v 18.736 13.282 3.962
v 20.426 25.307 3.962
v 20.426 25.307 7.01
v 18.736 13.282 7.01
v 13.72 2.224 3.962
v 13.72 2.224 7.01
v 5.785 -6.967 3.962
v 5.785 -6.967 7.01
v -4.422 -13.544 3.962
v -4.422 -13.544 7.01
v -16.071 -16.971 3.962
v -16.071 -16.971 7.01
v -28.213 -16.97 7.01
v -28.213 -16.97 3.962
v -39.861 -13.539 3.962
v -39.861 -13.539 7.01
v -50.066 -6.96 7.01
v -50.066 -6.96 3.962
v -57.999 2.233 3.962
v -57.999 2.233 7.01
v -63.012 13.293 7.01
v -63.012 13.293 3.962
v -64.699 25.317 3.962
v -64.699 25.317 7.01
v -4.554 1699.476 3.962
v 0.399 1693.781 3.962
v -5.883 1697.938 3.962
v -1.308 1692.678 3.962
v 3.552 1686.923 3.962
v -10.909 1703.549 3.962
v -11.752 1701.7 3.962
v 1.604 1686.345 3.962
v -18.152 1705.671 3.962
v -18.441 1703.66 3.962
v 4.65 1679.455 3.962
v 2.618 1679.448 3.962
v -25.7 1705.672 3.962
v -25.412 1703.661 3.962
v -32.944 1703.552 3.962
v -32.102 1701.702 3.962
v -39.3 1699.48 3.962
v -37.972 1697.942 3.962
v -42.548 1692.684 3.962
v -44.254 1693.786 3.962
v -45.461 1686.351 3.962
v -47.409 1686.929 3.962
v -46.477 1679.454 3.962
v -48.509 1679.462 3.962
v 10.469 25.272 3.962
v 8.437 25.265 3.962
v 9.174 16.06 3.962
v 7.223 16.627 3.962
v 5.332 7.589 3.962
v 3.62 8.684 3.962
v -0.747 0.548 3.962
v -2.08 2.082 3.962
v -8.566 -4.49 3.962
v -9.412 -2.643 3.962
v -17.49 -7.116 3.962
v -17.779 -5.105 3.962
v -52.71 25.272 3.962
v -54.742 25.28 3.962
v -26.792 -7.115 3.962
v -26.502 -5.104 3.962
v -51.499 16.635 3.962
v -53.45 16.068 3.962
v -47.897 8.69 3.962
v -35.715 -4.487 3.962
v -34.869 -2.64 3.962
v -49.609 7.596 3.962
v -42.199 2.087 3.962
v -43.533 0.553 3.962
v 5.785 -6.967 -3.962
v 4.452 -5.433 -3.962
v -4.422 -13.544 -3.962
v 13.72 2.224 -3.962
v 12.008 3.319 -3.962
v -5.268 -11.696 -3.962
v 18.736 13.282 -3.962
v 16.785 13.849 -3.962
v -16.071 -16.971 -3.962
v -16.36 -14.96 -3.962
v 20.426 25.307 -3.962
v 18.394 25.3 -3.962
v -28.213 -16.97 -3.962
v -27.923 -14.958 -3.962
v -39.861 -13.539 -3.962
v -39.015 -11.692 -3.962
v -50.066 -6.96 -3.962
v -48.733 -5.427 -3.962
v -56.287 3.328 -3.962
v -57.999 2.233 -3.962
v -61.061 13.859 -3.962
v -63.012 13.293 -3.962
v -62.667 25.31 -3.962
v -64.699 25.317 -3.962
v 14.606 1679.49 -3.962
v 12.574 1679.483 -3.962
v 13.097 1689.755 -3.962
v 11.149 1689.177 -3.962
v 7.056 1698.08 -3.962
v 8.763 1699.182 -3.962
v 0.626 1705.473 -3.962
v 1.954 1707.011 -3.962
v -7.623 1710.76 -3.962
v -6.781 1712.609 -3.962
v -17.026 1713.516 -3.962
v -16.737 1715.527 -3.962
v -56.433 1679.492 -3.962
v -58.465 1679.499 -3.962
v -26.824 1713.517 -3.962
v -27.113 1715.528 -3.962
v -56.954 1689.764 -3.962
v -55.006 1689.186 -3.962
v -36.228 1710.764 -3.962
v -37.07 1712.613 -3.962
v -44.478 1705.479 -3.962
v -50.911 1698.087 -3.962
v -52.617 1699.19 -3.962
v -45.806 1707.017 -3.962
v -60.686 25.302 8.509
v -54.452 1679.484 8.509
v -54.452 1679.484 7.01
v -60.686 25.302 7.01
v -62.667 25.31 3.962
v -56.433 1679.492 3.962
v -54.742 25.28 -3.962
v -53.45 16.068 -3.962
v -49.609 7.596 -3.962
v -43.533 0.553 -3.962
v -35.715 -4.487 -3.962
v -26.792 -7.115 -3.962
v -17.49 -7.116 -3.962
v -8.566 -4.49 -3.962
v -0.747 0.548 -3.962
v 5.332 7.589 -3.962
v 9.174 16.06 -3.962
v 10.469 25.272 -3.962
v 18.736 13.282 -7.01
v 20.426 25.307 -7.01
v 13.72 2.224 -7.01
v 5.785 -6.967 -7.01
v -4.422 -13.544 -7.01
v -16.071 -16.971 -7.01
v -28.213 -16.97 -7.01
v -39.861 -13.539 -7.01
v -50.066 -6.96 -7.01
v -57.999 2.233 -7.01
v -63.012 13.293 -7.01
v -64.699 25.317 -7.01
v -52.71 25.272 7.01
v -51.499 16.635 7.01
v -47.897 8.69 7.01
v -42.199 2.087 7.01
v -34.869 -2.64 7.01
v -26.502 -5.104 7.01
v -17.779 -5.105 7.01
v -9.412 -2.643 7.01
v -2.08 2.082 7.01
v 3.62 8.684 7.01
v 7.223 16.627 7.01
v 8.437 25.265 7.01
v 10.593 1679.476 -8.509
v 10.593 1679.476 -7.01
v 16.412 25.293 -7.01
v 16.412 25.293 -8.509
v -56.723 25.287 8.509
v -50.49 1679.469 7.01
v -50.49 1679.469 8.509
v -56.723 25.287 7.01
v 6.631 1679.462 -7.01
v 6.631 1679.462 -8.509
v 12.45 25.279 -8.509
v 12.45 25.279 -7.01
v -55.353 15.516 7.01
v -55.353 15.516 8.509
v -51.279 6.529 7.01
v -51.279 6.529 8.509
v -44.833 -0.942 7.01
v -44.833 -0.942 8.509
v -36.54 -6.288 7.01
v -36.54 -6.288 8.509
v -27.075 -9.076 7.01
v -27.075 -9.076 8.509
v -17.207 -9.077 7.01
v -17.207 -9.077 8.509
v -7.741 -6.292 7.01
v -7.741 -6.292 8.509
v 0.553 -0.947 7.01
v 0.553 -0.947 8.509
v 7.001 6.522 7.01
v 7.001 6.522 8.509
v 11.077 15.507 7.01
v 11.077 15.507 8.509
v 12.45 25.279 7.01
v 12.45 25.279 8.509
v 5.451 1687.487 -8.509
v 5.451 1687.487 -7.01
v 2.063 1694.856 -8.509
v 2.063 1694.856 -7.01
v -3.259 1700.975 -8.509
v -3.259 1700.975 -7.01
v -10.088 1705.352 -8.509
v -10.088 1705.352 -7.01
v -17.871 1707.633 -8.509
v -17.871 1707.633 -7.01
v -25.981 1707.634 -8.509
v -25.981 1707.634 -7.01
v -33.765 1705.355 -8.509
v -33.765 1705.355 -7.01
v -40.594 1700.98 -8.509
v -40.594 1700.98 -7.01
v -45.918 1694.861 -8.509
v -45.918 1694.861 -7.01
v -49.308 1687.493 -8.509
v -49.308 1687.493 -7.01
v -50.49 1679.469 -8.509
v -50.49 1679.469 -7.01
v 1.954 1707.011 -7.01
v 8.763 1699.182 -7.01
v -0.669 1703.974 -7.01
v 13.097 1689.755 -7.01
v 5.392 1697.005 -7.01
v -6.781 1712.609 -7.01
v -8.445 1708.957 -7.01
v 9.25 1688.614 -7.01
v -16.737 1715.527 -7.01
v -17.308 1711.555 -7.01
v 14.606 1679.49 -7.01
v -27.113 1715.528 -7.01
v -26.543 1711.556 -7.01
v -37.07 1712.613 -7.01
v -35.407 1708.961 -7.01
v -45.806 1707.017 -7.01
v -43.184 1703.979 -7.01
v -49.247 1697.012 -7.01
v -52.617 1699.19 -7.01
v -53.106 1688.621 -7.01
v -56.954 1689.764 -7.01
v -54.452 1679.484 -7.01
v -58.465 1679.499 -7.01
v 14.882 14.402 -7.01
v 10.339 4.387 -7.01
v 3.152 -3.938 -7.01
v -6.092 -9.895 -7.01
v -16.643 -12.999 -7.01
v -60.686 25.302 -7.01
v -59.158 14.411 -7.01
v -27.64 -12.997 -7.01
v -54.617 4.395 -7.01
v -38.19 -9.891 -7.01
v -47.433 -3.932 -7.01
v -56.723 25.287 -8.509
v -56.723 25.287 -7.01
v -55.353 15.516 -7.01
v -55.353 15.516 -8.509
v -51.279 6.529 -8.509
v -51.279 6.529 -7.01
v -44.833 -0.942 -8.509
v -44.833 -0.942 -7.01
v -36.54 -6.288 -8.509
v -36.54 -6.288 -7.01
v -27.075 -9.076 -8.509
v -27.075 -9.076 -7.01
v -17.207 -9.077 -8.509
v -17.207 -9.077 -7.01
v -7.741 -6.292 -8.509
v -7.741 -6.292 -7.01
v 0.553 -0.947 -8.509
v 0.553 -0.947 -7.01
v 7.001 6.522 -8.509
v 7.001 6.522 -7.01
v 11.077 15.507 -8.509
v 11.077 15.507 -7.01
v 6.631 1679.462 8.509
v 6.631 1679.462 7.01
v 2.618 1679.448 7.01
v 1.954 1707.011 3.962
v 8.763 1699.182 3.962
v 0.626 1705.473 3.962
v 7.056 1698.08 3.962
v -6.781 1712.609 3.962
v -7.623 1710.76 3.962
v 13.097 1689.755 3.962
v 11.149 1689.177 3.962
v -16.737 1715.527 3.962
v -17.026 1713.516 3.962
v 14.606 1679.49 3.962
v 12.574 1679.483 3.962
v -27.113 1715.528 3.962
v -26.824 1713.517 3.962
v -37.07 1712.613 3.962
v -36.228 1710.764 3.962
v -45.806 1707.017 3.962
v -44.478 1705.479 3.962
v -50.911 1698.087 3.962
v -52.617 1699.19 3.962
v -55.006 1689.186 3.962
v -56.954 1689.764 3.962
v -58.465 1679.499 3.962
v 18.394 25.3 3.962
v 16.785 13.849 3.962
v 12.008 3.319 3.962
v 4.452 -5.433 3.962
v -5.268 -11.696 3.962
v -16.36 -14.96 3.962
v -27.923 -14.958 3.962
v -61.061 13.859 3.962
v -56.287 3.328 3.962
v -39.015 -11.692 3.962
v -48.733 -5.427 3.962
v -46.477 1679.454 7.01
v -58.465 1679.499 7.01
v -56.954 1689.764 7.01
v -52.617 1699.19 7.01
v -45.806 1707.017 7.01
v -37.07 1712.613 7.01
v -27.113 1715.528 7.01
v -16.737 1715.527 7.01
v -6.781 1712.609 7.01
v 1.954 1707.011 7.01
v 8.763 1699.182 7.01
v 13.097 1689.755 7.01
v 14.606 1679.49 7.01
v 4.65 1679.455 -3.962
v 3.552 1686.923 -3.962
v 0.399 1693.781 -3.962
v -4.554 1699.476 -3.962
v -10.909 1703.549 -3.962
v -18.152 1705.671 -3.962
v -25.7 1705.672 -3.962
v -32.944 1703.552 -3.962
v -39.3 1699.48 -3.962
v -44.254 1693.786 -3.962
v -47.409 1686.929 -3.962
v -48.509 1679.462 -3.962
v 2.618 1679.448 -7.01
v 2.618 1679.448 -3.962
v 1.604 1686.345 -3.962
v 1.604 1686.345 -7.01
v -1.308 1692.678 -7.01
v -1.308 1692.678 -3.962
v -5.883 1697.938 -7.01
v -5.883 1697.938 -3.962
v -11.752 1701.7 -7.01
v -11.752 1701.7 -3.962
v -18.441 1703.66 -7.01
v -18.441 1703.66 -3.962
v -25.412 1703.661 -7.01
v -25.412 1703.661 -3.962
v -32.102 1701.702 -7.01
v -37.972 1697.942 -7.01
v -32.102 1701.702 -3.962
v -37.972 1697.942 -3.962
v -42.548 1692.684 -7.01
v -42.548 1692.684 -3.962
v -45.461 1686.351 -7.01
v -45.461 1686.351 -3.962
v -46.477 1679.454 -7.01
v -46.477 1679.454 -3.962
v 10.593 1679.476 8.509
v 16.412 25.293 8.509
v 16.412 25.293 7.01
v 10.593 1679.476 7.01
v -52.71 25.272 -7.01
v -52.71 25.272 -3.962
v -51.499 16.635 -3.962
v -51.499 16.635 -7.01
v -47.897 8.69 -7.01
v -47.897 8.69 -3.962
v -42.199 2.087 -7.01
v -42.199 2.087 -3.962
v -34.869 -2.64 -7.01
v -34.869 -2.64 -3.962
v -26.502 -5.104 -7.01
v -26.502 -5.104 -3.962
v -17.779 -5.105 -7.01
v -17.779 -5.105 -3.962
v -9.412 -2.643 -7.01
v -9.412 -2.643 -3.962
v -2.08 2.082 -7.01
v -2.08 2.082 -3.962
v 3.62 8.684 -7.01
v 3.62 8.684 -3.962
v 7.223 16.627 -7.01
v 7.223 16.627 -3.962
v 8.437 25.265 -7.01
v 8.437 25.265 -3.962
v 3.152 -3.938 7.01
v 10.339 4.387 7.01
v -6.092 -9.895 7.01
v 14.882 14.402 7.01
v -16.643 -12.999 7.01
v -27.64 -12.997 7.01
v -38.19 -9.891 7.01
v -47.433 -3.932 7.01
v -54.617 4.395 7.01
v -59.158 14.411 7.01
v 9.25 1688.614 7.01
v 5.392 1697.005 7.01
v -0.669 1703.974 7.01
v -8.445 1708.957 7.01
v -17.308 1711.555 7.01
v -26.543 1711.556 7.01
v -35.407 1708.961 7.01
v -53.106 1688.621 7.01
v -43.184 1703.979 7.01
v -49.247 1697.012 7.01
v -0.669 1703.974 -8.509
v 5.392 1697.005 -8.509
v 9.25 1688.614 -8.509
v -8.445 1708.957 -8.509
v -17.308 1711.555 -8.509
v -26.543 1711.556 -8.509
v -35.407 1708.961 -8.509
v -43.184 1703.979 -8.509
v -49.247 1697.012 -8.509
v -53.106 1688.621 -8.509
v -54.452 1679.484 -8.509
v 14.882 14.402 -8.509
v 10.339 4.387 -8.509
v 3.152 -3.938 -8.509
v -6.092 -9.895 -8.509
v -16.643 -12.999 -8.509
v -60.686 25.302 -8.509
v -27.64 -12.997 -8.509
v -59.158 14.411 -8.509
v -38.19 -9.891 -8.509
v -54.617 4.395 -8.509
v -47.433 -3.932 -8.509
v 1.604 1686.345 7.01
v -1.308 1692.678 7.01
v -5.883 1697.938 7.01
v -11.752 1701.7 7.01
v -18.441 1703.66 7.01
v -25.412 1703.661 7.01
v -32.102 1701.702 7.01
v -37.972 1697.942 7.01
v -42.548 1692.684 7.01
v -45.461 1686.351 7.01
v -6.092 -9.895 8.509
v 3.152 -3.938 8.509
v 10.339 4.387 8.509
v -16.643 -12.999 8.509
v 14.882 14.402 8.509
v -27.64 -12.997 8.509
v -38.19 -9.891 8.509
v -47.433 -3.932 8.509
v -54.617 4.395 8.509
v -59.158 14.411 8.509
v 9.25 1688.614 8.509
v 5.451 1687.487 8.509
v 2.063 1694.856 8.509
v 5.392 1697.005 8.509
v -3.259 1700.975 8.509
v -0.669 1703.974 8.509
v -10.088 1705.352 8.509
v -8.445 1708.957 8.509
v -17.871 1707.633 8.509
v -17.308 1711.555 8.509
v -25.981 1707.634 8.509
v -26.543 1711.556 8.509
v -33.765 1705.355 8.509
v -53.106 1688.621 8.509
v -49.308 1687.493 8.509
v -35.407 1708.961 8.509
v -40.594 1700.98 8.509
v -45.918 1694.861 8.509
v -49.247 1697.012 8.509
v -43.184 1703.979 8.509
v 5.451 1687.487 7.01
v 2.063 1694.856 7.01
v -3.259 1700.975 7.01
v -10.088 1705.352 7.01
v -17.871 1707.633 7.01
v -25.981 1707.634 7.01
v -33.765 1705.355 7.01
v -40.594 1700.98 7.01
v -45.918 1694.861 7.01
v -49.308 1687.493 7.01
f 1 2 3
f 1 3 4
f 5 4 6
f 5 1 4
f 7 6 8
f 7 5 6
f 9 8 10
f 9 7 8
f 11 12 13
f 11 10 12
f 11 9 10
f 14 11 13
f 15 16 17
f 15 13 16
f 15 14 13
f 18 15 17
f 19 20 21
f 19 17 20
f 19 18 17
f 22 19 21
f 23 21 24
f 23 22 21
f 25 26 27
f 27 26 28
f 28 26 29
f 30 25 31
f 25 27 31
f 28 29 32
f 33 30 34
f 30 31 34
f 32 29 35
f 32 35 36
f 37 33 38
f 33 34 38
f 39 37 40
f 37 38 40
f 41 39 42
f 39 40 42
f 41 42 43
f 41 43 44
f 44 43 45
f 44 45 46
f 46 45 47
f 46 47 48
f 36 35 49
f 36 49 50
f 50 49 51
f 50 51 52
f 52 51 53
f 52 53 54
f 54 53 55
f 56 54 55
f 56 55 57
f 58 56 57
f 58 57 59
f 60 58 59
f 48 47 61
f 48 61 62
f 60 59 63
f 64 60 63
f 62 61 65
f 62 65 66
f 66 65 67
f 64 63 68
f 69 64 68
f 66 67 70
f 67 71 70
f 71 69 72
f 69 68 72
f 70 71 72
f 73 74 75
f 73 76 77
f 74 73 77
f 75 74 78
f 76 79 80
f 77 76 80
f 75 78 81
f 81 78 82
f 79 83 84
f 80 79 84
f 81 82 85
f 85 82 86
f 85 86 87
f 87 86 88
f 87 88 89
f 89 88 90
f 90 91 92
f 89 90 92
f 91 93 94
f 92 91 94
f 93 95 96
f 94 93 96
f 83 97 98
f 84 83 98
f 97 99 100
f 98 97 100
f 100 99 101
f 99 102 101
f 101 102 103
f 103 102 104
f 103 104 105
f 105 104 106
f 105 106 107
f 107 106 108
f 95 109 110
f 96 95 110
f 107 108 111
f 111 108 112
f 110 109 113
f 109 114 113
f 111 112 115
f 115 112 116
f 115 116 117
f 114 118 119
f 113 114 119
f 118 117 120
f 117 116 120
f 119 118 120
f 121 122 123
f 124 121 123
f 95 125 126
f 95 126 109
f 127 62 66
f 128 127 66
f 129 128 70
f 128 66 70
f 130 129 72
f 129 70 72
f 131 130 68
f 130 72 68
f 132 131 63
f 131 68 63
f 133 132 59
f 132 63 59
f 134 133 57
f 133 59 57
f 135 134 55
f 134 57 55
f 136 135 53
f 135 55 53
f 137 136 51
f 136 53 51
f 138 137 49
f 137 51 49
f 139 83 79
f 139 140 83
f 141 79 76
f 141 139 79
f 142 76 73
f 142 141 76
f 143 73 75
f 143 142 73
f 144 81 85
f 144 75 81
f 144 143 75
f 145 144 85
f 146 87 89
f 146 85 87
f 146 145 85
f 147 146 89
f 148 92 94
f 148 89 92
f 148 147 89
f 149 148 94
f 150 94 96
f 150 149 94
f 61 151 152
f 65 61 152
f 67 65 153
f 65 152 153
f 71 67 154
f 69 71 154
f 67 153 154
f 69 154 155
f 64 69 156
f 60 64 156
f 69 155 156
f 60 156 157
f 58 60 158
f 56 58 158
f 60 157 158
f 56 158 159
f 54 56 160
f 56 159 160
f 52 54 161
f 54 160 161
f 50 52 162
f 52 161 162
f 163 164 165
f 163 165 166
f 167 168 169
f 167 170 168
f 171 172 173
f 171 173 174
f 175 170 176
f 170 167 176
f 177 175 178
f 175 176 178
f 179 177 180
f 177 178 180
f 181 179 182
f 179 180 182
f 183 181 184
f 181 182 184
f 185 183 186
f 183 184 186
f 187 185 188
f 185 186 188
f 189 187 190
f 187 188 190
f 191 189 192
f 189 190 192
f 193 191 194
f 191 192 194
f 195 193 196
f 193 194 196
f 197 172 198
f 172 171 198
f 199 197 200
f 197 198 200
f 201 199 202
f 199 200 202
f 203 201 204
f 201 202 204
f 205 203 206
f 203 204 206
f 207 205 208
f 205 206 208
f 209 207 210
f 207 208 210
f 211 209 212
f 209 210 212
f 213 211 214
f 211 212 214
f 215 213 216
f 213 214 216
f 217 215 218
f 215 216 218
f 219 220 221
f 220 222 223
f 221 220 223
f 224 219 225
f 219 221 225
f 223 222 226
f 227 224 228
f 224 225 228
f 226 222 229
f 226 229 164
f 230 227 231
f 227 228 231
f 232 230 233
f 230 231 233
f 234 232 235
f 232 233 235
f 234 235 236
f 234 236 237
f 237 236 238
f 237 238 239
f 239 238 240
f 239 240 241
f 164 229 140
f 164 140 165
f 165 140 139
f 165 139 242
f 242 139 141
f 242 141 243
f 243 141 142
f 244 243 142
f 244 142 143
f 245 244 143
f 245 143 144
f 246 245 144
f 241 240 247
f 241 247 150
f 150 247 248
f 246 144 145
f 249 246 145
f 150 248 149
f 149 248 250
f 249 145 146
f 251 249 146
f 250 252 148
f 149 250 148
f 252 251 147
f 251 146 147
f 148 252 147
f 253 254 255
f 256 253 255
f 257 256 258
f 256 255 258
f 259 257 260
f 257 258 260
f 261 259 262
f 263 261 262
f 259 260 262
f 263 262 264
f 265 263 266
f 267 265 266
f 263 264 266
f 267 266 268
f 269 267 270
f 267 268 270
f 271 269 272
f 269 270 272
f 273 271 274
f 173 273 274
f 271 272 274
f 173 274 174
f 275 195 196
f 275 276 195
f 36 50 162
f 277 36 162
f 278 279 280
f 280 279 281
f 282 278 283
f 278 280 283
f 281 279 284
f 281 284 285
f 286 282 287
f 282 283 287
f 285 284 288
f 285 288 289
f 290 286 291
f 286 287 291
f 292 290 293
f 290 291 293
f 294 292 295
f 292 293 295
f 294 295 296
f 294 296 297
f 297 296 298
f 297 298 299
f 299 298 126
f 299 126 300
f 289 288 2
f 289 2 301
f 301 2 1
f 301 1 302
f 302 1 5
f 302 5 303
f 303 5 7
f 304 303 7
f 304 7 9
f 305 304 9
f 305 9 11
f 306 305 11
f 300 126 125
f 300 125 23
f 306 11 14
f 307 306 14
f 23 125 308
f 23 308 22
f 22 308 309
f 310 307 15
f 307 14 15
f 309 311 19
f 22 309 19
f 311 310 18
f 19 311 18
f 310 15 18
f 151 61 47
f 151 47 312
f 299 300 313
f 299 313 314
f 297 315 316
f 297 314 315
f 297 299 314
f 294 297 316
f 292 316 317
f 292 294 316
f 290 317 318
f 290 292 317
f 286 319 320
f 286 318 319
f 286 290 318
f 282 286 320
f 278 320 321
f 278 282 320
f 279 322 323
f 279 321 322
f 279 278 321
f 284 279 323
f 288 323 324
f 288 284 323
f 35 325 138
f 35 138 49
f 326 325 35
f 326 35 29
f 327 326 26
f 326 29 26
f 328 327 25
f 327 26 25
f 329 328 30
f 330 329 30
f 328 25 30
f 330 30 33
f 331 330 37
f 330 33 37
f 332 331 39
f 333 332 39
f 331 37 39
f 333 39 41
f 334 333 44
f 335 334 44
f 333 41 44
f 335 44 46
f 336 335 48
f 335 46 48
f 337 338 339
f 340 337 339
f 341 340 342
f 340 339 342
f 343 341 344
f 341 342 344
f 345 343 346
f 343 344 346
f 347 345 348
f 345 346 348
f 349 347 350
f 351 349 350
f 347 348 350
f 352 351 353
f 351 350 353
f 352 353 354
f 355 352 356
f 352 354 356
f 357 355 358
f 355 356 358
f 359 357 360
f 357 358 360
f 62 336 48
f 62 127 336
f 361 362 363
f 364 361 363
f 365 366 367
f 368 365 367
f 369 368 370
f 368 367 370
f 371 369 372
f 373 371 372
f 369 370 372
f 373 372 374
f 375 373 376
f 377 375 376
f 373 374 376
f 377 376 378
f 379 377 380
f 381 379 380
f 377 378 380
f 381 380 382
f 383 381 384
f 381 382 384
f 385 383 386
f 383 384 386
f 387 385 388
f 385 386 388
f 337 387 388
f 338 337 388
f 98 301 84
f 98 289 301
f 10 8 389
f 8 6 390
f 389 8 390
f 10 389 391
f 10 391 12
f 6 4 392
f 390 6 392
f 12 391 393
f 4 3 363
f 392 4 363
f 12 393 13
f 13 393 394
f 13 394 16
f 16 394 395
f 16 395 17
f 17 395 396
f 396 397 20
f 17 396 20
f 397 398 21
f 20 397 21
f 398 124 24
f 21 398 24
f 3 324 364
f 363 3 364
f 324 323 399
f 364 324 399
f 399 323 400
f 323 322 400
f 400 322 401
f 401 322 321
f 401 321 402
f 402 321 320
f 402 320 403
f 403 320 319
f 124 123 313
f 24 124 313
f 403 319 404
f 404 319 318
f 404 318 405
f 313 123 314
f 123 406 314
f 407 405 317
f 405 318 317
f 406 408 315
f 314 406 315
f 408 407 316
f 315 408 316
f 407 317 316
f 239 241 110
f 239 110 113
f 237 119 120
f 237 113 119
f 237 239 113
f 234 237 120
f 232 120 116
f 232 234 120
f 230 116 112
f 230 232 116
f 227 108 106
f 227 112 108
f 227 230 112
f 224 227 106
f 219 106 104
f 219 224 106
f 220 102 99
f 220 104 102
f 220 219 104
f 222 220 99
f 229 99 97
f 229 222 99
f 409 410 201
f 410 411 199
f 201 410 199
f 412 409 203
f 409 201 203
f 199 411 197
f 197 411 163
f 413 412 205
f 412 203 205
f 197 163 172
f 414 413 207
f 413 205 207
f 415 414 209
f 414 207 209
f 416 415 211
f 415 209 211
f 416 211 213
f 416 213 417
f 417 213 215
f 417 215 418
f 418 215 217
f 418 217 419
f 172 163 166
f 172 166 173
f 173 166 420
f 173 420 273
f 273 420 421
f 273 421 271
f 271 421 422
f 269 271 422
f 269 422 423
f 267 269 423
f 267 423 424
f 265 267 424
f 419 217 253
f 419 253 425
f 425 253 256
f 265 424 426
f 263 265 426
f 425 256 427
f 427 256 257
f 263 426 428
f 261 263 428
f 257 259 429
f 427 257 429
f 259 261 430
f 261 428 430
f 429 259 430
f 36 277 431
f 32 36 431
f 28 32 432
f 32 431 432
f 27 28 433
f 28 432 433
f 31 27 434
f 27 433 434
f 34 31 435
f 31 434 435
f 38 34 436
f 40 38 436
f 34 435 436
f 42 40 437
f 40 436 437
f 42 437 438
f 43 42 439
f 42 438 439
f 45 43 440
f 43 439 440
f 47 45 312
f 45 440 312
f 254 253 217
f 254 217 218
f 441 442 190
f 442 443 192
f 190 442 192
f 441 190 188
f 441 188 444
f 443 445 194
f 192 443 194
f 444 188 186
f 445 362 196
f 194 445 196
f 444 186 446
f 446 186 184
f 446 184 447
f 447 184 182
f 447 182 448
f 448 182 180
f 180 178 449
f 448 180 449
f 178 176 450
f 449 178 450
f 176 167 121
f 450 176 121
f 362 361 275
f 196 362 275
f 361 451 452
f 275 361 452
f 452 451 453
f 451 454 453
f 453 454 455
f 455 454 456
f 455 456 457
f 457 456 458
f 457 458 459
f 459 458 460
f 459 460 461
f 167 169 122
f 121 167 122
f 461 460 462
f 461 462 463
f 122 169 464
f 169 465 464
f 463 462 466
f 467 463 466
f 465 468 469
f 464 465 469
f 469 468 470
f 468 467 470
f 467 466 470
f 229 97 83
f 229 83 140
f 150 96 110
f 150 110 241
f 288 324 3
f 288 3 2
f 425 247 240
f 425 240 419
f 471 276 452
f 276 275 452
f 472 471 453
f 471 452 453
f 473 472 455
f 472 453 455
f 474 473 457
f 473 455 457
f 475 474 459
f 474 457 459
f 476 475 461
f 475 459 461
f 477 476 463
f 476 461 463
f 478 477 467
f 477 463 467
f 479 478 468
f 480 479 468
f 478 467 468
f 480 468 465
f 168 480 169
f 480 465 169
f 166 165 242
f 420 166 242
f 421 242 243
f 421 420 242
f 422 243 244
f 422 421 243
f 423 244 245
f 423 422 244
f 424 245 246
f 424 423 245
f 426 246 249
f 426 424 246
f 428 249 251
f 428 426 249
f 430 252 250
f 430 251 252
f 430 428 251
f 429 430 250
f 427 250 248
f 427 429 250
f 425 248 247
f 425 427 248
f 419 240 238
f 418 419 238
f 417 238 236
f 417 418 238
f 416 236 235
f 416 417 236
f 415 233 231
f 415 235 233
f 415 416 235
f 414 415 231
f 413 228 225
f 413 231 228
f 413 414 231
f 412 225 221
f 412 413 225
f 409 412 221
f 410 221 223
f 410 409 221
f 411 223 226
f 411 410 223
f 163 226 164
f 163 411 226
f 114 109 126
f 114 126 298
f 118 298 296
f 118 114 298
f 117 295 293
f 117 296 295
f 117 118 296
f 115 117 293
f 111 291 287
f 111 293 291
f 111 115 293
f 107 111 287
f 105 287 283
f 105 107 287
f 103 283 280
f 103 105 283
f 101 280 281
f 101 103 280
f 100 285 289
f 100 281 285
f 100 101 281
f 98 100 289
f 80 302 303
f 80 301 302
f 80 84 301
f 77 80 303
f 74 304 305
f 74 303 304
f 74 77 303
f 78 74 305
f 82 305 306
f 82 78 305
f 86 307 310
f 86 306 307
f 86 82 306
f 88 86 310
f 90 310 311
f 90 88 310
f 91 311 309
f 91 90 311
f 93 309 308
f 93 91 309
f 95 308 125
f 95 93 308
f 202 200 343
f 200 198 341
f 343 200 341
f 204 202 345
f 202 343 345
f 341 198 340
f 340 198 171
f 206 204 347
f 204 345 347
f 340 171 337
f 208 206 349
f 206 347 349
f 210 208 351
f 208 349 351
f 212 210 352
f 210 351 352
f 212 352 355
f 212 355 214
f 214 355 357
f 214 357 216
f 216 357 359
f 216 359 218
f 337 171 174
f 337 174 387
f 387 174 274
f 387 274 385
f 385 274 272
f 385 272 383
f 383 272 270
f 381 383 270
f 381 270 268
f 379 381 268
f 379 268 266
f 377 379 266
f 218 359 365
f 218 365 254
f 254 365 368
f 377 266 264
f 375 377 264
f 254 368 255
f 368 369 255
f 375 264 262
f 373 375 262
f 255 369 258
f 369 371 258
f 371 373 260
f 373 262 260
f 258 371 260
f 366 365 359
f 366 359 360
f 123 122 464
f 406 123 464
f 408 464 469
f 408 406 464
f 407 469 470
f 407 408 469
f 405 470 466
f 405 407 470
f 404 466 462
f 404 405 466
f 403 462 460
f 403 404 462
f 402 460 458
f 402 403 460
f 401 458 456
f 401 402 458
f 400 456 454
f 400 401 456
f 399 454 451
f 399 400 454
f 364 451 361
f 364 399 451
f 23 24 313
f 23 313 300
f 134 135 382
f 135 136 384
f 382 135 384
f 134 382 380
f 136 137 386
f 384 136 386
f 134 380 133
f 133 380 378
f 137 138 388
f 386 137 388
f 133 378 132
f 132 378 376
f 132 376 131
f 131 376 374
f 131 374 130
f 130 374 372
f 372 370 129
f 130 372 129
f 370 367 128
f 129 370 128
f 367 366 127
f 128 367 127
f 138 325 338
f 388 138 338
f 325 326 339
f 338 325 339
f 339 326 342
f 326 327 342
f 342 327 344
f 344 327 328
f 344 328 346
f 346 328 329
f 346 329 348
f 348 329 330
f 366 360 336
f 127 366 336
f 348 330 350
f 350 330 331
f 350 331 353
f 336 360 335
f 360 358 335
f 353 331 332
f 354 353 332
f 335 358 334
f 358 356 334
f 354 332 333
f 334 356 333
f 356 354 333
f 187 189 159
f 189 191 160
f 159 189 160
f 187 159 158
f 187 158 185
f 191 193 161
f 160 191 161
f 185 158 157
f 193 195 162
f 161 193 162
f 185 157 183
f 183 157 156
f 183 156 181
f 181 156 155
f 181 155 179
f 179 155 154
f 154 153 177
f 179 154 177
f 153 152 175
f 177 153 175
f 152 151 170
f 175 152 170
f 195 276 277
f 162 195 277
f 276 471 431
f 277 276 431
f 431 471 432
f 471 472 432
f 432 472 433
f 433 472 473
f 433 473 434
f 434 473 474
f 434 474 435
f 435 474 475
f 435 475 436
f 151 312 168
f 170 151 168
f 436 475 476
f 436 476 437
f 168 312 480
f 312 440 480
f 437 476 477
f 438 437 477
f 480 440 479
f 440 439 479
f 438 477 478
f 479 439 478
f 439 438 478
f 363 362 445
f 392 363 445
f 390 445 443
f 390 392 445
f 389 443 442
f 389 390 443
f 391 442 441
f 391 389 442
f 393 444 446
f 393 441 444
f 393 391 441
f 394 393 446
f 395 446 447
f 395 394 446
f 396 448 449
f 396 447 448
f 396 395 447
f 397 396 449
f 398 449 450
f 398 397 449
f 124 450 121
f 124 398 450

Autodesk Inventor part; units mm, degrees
ref_plane "Arbeitsebene2" through (-22.1367, 25.157, 0) normal (-1, 0, 0) x (0, 0, 1)
ref_plane "Arbeitsebene3" through (-21.9295, 1679.3618, 0) normal (-0.1021834, -0.9947656, 0) x (0, 0, 1)
sketch "Pfad" plane through (0, 0, 0) normal (0, 0, 1) x (1, 0, 0)
  arc A0 (-58.7046, 25.2948) -> (14.4313, 25.2856) centre (-22.1367, 25.157) ccw
  arc A1 (8.6121, 1679.4693) -> (-52.4711, 1679.4769) centre (-21.9295, 1679.3618) ccw
  line L0 (8.6121, 1679.4693) -> (14.4313, 25.2856)
  line L1 (-58.7046, 25.2948) -> (-52.4711, 1679.4769)
  dimension "d31" = 11.9888
ref_plane "Profilebene" through (14.4313, 25.2856, 0) normal (-0.0035178, 0.9999938, 0) x (0, 0, 1)
sketch "Profilskizze" plane through (14.4313, 25.2856, 0) normal (-0.0035178, 0.9999938, 0) x (0, 0, 1)
  line L0 (-8.509, -1.9812) -> (8.509, -1.9812)
  line L1 (8.509, -1.9812) -> (8.509, 1.9812)
  line L2 (8.509, 1.9812) -> (-8.509, 1.9812)
  line L3 (-8.509, 1.9812) -> (-8.509, -1.9812)
  line L4 (-3.9624, -3.9624) -> (3.9624, -3.9624)
  line L5 (3.9624, -3.9624) -> (3.9624, 3.9624)
  line L6 (3.9624, 3.9624) -> (-3.9624, 3.9624)
  line L7 (-3.9624, 3.9624) -> (-3.9624, -3.9624)
  line L8 (-3.9624, 0) -> (3.9624, 0) construction
  line L9 (-7.0104, -5.9944) -> (-3.9624, -5.9944)
  line L10 (-3.9624, -5.9944) -> (-3.9624, 5.9944)
  line L11 (-3.9624, 5.9944) -> (-7.0104, 5.9944)
  line L12 (-7.0104, 5.9944) -> (-7.0104, -5.9944)
  line L13 (3.9624, -5.9944) -> (7.0104, -5.9944)
  line L14 (7.0104, -5.9944) -> (7.0104, 5.9944)
  line L15 (7.0104, 5.9944) -> (3.9624, 5.9944)
  line L16 (3.9624, 5.9944) -> (3.9624, -5.9944)
  line L17 (-8.509, 0) -> (8.509, 0) construction
  point P0 (0, 0)
  point P1 (0, 0)
  dimension "d21" = 3.9624
  dimension "d22" = 7.9248
  dimension "d23" = 7.9248
  dimension "d24" = 3.048
  dimension "d31" = 11.9888
  dimension "d32" = 17.018
sweep "Volumenkörper" add profiles "Profilskizze" path "Pfad"
pattern_of_one "Strand Pattern"
equation "\"d21\" = da_d2"
equation "\"d22\" = da_d1"
equation "\"d23\" = da_b1"
equation "\"d24\" = da_t1 + da_t2"
equation "\"d30\" = da_pt"
equation "\"da_p\" = 12.7"
equation "\"da_b1\" = 7.9248"
equation "\"da_h2\" = 11.9888"
equation "\"da_h3\" = 10.3886"
equation "\"da_d1\" = 7.9248"
equation "\"da_d2\" = 3.9624"
equation "\"da_pt\" = 14.3764"
equation "\"da_b\" = 17.018"
equation "\"da_t1\" = 1.524"
equation "\"da_t2\" = 1.524"
properties part number "HTW-000643" material "Edelstahl"
